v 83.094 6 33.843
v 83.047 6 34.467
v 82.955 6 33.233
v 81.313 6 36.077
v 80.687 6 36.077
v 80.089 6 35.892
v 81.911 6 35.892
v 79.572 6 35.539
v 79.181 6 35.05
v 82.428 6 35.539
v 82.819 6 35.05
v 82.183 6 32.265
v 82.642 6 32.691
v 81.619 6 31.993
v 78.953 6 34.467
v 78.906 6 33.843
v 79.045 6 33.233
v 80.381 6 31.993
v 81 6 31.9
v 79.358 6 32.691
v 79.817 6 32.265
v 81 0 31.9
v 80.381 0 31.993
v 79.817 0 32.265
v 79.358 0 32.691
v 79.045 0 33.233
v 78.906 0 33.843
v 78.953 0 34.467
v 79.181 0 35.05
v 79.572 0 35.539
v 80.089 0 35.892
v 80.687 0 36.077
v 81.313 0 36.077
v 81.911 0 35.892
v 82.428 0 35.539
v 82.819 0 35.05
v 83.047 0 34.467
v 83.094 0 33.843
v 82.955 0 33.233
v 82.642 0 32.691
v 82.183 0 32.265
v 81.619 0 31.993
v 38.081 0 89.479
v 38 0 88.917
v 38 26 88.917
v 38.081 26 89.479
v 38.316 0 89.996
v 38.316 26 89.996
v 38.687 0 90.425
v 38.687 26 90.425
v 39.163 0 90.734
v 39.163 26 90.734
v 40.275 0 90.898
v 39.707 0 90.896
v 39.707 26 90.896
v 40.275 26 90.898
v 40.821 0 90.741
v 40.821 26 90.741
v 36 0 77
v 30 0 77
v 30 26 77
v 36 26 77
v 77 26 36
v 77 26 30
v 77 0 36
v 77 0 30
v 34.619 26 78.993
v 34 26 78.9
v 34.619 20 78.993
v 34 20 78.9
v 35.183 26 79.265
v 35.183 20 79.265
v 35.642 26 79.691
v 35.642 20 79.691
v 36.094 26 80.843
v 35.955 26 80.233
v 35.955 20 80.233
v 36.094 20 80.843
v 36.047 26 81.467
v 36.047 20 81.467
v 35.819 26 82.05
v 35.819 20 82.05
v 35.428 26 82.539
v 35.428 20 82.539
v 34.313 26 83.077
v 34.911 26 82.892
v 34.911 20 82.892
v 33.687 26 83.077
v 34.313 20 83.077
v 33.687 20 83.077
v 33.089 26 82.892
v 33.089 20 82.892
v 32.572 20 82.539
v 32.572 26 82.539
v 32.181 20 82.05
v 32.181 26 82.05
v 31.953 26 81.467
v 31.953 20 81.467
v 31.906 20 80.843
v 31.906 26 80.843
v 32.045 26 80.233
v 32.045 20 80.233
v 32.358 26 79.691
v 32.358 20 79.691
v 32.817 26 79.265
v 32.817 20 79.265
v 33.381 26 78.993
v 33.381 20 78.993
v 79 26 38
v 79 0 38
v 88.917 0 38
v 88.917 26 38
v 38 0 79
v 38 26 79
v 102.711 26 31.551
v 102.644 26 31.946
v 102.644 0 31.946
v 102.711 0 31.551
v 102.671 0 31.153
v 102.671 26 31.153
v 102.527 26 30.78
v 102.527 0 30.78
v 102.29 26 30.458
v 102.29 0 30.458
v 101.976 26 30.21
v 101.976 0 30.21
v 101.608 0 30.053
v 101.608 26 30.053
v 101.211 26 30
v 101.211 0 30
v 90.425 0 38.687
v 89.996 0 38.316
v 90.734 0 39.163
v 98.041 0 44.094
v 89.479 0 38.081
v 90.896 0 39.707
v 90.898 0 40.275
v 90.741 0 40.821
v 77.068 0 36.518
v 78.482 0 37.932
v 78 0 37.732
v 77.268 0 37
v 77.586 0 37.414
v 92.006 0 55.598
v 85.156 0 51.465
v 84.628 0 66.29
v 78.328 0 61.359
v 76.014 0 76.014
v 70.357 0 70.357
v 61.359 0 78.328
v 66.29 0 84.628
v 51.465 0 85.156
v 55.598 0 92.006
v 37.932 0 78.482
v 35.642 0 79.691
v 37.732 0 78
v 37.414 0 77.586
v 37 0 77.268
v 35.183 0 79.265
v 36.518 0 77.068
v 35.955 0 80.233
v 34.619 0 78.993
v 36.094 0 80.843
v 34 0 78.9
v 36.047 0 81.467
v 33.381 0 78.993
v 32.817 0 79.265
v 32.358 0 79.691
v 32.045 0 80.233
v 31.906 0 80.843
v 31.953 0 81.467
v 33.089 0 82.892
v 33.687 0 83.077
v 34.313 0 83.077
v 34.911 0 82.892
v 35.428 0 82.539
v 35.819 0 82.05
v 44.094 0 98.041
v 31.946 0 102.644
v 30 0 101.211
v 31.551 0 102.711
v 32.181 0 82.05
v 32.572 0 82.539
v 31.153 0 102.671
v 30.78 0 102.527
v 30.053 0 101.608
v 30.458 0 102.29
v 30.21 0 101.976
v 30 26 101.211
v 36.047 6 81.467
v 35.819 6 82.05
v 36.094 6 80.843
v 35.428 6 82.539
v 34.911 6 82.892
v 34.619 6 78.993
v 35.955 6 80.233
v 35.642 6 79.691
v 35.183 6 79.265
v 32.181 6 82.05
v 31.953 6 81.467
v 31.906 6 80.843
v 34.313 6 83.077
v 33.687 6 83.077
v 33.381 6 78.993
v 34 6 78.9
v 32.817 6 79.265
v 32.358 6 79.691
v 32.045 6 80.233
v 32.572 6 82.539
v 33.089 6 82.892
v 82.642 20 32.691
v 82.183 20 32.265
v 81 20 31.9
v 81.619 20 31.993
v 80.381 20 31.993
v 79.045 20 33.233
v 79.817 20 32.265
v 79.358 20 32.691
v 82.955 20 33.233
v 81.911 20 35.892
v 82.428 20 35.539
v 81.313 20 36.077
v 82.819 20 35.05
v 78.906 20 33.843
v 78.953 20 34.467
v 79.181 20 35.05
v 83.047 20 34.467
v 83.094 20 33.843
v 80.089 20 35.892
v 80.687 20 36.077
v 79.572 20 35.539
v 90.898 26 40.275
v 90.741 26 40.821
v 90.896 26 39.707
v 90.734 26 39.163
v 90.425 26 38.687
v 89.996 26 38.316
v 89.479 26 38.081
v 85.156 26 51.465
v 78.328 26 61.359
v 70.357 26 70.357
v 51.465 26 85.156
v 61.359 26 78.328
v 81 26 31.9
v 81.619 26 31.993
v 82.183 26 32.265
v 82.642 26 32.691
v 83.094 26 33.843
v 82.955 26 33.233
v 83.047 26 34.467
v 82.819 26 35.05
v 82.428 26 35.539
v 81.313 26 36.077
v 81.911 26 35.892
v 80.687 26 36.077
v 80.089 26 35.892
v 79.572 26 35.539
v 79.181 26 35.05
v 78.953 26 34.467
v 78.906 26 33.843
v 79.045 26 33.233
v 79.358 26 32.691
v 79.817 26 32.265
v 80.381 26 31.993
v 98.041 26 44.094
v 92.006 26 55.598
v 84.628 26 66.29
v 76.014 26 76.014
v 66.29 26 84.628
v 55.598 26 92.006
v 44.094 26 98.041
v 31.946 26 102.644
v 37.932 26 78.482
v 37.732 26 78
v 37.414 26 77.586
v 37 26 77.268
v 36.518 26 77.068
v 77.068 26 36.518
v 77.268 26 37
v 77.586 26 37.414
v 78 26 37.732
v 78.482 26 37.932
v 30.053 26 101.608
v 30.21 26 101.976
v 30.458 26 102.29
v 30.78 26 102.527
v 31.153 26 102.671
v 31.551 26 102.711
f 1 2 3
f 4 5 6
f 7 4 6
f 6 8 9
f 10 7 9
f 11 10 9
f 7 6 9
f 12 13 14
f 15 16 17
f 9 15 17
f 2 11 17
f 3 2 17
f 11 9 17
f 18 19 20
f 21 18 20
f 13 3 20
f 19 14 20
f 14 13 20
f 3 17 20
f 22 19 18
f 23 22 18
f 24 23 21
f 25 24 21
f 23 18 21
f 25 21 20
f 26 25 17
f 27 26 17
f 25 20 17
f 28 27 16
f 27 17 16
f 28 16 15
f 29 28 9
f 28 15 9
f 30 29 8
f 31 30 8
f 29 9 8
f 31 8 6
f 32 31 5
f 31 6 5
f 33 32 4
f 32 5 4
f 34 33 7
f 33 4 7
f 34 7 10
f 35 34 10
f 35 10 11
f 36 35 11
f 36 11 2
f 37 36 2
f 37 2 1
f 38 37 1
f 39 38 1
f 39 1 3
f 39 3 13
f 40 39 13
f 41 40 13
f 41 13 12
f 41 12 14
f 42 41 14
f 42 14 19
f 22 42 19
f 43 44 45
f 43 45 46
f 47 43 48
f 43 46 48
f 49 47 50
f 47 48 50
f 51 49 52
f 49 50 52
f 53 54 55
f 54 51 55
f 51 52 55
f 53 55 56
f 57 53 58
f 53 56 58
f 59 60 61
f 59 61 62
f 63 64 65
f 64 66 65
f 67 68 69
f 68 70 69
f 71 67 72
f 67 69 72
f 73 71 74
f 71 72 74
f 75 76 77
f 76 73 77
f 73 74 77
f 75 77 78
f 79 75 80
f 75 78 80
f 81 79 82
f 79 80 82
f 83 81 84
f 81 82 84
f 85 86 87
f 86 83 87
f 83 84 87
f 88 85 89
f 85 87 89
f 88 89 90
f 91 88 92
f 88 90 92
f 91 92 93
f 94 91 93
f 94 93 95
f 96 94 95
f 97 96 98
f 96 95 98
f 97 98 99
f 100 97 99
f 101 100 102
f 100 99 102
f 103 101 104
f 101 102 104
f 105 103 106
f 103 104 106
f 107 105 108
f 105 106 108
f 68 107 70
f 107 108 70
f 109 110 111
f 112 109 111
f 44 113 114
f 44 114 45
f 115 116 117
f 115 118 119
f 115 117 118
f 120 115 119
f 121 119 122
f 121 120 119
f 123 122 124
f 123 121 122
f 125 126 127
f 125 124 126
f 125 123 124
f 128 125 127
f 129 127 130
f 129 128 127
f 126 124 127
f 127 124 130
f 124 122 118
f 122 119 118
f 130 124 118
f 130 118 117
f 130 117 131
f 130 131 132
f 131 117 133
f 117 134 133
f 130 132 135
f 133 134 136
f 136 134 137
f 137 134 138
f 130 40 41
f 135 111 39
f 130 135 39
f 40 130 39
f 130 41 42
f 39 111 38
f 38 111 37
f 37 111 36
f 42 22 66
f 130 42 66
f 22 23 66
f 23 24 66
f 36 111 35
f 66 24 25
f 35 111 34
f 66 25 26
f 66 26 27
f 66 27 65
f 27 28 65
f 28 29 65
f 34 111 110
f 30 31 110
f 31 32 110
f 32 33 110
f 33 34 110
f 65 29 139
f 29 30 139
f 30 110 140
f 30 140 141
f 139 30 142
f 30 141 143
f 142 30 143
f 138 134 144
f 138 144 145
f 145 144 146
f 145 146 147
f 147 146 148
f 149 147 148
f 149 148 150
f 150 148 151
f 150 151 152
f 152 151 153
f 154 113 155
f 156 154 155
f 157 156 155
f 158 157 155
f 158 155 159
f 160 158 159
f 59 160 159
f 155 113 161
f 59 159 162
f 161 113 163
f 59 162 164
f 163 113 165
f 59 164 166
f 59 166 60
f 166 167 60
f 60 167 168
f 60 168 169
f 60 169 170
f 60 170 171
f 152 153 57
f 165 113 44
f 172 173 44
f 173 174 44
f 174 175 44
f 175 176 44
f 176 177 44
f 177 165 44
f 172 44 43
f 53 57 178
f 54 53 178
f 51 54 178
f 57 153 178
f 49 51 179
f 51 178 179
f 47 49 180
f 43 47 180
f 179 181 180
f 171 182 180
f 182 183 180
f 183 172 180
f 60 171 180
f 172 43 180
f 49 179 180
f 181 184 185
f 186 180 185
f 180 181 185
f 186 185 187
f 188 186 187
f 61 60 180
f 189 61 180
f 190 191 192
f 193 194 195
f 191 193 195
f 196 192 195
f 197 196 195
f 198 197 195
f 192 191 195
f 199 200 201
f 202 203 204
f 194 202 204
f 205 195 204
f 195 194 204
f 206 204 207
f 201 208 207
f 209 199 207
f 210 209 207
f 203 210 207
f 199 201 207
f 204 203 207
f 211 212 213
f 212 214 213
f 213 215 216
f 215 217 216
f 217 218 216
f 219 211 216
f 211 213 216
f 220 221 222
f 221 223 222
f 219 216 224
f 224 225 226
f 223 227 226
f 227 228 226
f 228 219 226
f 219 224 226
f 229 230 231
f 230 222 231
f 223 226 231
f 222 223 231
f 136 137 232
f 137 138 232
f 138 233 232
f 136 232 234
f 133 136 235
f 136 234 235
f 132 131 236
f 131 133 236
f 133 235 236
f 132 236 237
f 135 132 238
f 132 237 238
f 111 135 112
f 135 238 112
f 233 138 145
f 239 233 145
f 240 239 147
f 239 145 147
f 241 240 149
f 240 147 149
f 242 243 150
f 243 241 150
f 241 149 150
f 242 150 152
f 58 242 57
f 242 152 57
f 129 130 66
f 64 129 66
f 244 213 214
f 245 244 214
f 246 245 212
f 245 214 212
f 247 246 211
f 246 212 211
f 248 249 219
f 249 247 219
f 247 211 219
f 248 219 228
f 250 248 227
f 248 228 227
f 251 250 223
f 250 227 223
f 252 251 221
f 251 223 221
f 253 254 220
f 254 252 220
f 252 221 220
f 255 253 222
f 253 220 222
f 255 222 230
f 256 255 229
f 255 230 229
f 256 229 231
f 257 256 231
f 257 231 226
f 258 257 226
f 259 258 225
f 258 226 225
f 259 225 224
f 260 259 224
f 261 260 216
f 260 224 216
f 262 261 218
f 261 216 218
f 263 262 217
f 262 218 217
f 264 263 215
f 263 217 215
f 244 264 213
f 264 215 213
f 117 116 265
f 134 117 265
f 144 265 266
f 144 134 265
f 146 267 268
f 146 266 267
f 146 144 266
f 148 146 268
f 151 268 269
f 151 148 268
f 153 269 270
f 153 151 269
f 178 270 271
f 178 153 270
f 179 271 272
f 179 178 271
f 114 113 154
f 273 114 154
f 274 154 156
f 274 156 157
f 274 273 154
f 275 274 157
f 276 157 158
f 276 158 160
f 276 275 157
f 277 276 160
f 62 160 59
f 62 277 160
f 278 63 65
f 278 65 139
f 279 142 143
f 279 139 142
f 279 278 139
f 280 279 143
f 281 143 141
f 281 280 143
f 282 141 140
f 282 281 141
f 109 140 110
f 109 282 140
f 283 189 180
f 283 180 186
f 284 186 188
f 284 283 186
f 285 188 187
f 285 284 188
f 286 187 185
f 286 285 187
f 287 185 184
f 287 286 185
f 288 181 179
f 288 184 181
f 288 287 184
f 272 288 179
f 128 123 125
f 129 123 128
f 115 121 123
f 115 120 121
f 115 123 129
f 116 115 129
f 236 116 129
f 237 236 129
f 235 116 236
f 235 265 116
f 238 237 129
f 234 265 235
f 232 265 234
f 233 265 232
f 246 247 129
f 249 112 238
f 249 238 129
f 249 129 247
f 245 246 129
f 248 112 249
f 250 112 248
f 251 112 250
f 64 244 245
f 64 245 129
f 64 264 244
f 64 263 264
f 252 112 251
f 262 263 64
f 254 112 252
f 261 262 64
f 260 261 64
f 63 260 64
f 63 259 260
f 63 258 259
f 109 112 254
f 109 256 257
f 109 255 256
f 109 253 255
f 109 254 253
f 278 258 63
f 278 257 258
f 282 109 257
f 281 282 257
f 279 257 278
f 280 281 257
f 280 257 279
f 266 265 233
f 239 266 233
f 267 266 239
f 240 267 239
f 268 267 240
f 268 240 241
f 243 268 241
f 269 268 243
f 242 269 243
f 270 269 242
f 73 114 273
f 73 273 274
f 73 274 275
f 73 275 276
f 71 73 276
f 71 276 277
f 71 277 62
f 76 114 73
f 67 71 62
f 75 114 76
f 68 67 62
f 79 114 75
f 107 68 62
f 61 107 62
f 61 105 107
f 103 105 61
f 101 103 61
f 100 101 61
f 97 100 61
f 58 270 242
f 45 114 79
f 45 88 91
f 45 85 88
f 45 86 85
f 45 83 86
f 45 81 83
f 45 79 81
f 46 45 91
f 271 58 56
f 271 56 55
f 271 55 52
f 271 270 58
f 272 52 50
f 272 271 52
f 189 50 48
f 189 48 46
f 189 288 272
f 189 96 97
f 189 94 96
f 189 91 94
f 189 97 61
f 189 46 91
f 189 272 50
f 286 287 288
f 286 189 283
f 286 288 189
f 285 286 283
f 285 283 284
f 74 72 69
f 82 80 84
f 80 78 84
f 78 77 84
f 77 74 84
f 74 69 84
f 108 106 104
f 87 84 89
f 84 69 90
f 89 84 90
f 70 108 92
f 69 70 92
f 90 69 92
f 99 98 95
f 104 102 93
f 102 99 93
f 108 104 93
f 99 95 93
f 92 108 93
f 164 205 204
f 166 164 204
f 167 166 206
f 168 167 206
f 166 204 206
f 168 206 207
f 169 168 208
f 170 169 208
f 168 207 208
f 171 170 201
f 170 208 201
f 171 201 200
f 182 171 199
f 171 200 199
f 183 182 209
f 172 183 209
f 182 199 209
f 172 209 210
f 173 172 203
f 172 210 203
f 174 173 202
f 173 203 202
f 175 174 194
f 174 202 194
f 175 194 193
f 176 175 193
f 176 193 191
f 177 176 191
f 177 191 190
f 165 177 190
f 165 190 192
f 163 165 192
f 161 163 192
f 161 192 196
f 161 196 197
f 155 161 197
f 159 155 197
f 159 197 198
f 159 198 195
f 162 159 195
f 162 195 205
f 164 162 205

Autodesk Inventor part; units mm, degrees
ref_plane "YZ Plane" through (0, 0, 0) normal (1, 0, 0) x (0, 1, 0)
ref_plane "XZ Plane" through (0, 0, 0) normal (0, 1, 0) x (-1, 0, 0)
sketch "Sketch1" plane through (0, 0, 0) normal (0, 1, 0) x (-1, 0, 0)
  line L0 (-130, 30) -> (130, 30)
  line L1 (130, 30) -> (130, -30)
  line L2 (130, -30) -> (-130, -30)
  line L3 (-130, -30) -> (-130, 30)
  line L4 (-130, 30) -> (130, -30) construction
  line L5 (130, 30) -> (-130, -30) construction
  line L6 (-30, -130) -> (-30, 130)
  line L7 (-30, 130) -> (30, 130)
  line L8 (30, 130) -> (30, -130)
  line L9 (30, -130) -> (-30, -130)
  line L10 (-30, -130) -> (30, 130) construction
  line L11 (-30, 130) -> (30, -130) construction
  line L12 (130, -30) -> (-130, -30)
  line L13 (-130, -30) -> (-130, 30)
  line L14 (-130, 30) -> (130, 30)
  line L15 (130, 30) -> (130, -30)
  line L16 (130, -30) -> (-130, 30) construction
  line L17 (-130, -30) -> (130, 30) construction
  line L18 (30, 130) -> (30, -130)
  line L19 (30, -130) -> (-30, -130)
  line L20 (-30, -130) -> (-30, 130)
  line L21 (-30, 130) -> (30, 130)
  line L22 (30, 130) -> (-30, -130) construction
  line L23 (30, -130) -> (-30, 130) construction
  arc A0 (130, -30) -> (130, 30) centre (0, 0) ccw
  line L24 (-130, 0) -> (-107.5, 0) construction
  circle A1 centre (0, 0) radius 107.5
  circle A2 centre (0, 0) radius 92.5
  line L25 (-30, 87.5) -> (-30, 77)
  line L26 (-30, 77) -> (-38, 77)
  circle A3 centre (0, 0) radius 99.5
  line L27 (-38, 77) -> (-38, 91.9579)
  line L28 (-87.5, 30) -> (-77, 30)
  line L29 (-77, 30) -> (-77, 38)
  line L30 (-77, 38) -> (-91.9579, 38)
  line L31 (-34, 77) -> (-34, 81) construction
  line L32 (-77, 34) -> (-81, 34) construction
  line L33 (-81, 34) -> (-81, 30) construction
  point P0 (-30, 30)
  point P1 (-30, 30)
  point P2 (-30, 77)
  point P3 (-30, 103.2291)
  point P4 (-103.2291, 30)
  point P5 (-77, 30)
  dimension "d1" = 260
  dimension "d2" = 60
  dimension "d5" = 360
  dimension "d7" = 22.5
  dimension "d8" = 15
  dimension "d9" = 10.5
  dimension "d10" = 8
  dimension "d11" = 8
  dimension "d12" = 10.5
  dimension "d13" = 8
  dimension "d14" = 4
  dimension "d15" = 4
  dimension "d16" = 4
extrude "Extrusion1" add sketch "Sketch1" along normal blind 26 contours A2 L30 L29 L0 | L0 A3 L30 A2 | L0 A1 L6 A3 | L27 A3 L6 A2 | A2 L6 L26 L27
fillet "Fillet1" radius 2 4 edges at (38, 13, 91.9579) (91.9579, 13, 38) (77, 13, 38) (38, 13, 77)
hole "Hole1" at (34, 0, 81) at (81, 0, 34) direction (0, 1, 0) diameter 4.2 depth 6
ref_plane "Work Plane1" through (0, 13, 0) normal (0, 1, 0) x (1, 0, 0)
mirror "Mirror1" about plane through (0, 13, 0) normal (0, 1, 0) of "Hole1"
fillet "Fillet2" radius 1.5 2 edges at (103.2291, 13, 30) (30, 13, 103.2291)
equation "\"d9\" = d12"
equation "\"d10\" = d11"
equation "\"d13\" = d11"
equation "\"d14\" = 0.5 * d11"
equation "\"d15\" = 0.5 * d11"
equation "\"d16\" = 0.5 * d11"
properties part number "Side Wall"
